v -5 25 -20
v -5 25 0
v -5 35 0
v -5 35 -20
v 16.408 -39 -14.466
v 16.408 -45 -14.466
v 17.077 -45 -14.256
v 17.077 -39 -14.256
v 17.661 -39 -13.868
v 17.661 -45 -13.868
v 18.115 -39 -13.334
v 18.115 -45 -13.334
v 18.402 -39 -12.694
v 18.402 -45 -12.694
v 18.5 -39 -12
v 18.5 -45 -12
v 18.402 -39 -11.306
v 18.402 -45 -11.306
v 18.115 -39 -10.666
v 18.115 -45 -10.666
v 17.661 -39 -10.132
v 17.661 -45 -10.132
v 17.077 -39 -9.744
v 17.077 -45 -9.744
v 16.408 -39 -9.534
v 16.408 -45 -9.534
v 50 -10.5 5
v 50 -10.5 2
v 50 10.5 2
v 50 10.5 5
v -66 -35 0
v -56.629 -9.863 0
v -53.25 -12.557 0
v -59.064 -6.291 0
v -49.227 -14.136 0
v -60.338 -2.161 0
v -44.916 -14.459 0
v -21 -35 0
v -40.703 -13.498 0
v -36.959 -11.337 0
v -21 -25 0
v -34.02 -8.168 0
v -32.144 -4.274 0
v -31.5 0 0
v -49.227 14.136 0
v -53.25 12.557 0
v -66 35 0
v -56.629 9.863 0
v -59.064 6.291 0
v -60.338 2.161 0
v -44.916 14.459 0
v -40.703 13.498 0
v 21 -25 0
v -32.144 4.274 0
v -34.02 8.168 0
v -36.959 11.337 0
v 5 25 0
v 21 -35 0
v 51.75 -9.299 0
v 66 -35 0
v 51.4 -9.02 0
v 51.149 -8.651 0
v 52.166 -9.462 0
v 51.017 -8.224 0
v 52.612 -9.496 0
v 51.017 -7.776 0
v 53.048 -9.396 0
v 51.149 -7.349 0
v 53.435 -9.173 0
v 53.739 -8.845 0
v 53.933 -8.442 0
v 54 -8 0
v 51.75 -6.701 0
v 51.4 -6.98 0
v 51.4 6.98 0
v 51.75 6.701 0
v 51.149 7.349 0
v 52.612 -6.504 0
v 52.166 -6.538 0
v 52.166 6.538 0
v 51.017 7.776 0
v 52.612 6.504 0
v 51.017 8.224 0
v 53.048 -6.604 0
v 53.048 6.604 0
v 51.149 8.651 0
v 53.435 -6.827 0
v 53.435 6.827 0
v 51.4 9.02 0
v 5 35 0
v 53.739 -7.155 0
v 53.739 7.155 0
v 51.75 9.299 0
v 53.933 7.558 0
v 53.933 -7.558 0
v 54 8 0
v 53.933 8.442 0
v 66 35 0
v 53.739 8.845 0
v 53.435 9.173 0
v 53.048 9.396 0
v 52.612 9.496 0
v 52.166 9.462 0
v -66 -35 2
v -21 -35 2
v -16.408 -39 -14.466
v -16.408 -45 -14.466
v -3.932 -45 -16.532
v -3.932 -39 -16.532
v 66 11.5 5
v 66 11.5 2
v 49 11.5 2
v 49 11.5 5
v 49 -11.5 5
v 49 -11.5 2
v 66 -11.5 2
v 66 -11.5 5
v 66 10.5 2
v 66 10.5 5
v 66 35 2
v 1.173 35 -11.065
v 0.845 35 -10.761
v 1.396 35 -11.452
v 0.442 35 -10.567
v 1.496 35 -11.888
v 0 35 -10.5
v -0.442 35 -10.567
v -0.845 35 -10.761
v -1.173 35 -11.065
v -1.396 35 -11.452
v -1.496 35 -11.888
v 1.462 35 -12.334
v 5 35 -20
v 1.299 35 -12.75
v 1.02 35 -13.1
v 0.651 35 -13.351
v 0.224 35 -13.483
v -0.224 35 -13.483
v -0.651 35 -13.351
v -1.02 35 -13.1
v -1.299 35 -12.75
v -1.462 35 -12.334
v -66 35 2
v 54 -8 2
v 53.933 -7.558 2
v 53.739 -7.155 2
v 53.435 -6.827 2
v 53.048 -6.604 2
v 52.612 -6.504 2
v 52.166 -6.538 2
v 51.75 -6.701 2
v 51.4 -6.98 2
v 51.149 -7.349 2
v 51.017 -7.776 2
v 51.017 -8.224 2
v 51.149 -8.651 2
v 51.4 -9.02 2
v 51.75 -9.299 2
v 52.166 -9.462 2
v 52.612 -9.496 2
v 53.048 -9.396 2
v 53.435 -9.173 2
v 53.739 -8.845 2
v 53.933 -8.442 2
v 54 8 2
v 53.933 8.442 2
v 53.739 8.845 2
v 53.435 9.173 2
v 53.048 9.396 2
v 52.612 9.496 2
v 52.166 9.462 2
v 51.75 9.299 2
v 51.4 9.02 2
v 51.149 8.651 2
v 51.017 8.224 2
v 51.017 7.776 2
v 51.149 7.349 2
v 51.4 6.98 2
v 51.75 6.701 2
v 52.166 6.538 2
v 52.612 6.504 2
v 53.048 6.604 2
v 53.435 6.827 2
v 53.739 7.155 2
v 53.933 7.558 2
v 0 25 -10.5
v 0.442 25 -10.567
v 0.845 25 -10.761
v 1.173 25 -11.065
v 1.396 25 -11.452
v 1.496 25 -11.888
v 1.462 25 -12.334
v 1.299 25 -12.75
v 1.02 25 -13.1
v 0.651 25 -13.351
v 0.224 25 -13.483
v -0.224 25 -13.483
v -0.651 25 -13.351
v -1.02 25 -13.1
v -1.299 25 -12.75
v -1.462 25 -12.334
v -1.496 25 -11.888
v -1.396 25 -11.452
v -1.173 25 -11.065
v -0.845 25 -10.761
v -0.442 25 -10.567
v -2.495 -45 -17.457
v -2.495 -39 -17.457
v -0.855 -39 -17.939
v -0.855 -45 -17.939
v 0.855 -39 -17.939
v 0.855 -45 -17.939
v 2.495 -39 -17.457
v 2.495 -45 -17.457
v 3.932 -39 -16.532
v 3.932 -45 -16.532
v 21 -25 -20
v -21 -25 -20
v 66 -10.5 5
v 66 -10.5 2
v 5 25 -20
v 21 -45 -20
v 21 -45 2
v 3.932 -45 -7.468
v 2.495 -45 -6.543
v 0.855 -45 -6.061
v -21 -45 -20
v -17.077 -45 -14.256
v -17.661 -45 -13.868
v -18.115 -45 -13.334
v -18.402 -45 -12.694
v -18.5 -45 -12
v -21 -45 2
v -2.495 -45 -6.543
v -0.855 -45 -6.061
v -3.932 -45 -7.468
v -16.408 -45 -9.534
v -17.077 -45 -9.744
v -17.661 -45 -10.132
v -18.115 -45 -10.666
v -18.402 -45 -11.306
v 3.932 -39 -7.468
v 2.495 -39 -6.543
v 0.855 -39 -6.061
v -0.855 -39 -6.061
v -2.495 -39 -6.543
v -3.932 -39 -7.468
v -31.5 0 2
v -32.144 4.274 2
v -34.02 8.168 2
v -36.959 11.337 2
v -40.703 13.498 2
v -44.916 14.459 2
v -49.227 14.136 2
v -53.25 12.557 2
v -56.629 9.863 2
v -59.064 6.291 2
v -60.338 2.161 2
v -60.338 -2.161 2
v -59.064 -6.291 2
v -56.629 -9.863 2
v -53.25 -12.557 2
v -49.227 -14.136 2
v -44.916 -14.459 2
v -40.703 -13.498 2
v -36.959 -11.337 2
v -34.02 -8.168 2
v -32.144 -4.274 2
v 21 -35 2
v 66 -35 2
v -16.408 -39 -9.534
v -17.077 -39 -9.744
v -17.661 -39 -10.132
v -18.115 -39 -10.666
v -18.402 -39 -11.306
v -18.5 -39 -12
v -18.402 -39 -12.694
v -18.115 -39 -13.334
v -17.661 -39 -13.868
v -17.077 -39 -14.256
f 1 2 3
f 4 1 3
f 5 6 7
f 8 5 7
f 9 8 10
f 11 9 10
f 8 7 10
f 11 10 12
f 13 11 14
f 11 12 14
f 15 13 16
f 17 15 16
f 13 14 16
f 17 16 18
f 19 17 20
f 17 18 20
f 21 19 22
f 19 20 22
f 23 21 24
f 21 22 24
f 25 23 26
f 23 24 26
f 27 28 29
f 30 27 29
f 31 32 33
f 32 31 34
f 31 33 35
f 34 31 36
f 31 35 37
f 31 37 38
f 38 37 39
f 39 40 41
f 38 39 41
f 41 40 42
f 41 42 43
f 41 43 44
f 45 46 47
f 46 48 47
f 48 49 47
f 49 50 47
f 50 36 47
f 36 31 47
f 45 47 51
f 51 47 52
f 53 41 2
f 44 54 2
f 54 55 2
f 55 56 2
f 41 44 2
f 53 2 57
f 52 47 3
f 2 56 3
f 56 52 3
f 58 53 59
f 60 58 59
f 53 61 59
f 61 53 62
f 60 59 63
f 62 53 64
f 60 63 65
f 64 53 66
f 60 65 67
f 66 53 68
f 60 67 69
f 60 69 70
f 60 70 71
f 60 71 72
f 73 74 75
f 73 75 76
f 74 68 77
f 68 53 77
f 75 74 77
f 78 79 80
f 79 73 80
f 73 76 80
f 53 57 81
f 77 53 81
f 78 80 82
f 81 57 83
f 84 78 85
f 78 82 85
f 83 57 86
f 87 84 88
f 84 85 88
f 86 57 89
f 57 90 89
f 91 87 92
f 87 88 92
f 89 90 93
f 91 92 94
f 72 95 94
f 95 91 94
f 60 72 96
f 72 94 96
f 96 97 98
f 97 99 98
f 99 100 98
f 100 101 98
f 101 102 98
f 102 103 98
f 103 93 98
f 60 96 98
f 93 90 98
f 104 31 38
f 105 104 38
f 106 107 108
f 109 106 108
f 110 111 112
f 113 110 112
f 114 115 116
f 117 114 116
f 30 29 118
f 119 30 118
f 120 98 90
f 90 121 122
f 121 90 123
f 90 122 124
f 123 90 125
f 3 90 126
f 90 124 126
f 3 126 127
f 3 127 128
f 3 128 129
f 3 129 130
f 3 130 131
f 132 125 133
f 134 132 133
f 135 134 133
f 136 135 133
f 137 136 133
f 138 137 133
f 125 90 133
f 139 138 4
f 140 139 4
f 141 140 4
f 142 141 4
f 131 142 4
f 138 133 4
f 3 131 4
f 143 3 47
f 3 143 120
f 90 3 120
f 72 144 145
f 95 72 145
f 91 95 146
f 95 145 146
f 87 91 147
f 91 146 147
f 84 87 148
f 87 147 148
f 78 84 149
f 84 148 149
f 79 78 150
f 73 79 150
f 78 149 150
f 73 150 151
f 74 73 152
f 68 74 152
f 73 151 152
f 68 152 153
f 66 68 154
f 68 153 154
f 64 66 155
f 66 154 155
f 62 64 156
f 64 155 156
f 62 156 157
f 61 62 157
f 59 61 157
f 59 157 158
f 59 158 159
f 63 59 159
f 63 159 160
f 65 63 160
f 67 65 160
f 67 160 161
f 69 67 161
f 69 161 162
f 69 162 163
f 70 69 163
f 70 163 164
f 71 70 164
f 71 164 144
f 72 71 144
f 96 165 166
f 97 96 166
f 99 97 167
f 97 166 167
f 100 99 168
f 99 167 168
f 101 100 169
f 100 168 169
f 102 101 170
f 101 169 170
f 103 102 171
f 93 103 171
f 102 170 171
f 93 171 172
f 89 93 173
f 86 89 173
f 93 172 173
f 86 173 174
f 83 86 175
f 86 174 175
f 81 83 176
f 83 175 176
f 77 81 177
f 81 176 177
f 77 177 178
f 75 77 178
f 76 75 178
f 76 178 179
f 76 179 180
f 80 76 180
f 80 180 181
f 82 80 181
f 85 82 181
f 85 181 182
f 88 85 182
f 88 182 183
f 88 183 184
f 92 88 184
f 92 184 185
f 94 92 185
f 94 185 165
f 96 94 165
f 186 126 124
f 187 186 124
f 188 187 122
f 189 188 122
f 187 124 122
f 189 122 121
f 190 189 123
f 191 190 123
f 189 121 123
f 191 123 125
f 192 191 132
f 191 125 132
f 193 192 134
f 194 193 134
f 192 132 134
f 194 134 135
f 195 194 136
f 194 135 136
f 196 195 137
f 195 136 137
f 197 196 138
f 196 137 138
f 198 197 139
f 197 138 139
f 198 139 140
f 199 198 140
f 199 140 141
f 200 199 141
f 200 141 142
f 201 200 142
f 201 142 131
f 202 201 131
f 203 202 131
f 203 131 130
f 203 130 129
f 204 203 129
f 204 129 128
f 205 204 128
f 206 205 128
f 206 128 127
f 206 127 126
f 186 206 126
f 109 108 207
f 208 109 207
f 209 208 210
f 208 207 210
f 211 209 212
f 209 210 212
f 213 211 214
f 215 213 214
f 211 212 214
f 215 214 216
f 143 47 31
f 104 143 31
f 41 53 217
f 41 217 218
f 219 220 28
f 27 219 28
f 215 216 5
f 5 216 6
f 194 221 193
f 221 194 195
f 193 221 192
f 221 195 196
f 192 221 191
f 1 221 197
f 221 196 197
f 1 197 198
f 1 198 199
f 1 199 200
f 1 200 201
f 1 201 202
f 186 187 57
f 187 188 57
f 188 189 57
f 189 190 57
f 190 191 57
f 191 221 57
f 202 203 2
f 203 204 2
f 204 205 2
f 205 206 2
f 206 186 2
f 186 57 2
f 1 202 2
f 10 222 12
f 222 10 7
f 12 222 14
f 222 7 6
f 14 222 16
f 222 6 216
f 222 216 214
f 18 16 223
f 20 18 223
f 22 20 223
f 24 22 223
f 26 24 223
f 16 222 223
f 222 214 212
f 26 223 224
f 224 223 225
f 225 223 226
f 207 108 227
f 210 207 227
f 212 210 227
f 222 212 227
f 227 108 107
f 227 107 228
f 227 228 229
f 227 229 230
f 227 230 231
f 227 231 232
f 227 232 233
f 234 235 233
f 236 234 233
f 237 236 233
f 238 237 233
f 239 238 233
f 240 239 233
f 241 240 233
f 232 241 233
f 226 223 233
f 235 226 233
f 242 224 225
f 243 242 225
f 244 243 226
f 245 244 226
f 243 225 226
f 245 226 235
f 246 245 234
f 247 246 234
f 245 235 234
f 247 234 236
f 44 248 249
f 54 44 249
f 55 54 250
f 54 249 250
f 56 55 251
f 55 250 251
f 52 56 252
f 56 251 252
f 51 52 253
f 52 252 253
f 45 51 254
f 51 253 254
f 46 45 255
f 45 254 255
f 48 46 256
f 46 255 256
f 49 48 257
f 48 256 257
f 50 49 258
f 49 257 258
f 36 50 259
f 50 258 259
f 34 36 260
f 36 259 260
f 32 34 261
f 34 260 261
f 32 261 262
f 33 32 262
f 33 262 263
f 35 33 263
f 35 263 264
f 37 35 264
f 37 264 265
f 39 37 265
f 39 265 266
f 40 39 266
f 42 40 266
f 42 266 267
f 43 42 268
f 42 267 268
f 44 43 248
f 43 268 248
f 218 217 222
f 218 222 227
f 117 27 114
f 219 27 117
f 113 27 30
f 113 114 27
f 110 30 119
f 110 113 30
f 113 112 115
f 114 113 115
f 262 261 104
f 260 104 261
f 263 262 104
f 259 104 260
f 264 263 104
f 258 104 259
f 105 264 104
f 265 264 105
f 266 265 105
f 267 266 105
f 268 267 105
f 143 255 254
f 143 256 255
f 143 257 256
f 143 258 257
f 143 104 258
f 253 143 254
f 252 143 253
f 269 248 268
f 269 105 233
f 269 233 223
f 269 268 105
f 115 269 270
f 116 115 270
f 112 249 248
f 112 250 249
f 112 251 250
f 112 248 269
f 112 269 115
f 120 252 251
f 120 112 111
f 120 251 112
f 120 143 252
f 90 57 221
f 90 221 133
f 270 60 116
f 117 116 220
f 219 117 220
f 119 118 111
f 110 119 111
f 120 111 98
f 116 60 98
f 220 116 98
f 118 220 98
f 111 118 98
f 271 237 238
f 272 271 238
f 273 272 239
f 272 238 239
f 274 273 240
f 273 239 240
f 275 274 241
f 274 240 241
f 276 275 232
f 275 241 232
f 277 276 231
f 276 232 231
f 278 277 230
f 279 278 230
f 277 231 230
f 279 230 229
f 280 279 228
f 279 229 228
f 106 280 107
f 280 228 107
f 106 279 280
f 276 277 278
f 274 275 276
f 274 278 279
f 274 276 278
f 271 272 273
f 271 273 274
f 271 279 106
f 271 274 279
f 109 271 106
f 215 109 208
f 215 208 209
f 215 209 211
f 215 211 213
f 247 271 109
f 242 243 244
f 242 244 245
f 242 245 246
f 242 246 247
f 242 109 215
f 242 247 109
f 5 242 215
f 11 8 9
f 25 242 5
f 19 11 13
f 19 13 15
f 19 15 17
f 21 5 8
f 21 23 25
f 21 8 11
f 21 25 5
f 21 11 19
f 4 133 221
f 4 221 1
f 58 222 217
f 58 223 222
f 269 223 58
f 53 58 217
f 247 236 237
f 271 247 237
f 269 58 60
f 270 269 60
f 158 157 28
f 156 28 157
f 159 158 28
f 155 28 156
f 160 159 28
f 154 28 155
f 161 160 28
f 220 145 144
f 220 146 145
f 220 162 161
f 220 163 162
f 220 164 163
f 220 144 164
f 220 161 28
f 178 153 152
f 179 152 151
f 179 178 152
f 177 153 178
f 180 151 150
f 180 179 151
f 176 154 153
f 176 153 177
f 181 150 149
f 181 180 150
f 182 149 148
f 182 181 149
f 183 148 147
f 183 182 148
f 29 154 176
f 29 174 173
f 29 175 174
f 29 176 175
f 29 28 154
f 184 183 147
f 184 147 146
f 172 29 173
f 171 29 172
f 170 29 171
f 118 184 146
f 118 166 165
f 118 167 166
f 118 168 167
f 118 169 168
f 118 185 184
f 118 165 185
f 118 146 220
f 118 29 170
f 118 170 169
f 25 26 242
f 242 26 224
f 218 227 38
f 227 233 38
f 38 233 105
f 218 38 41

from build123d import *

# Parameters (mm, degrees)
BOSS_EXTRUDE1_DEPTH = 2
SKETCH2_R           = 14.5
CUT_EXTRUDE1_DEPTH  = 2
BOSS_EXTRUDE2_DEPTH = 3
CUT_EXTRUDE2_REACH  = 81.937
SKETCH5_R           = 1.5
SKETCH6_W           = 10
SKETCH6_H           = 10
BOSS_EXTRUDE3_DEPTH = 20
SKETCH10_W          = 42
SKETCH10_H          = 20
BOSS_EXTRUDE5_DEPTH = 20
CUT_EXTRUDE3_DEPTH  = 6
CUT_EXTRUDE4_REACH  = 107.622
SKETCH12_R          = 1.5


with BuildPart() as part:
    # Sketch1 → Boss-Extrude1 (new body)
    with BuildSketch(Plane.XY):
        Polygon((21, -35), (66, -35), (66, 35), (-66, 35), (-66, -35), (-21, -35), (-21, -45), (21, -45), align=None)
    extrude(amount=BOSS_EXTRUDE1_DEPTH)

    # Sketch2 → Cut-Extrude1 (cut)
    with BuildSketch(Plane.XY.offset(2)):
        with Locations((-46, 0)):
            Circle(SKETCH2_R)
    extrude(amount=-CUT_EXTRUDE1_DEPTH, mode=Mode.SUBTRACT)

    # Sketch3 → Boss-Extrude2 (add)
    with BuildSketch(Plane.XY.offset(2)):
        Polygon((50, -10.5), (50, 10.5), (66, 10.5), (66, 11.5), (49, 11.5), (49, -11.5), (66, -11.5), (66, -10.5), align=None)
    extrude(amount=BOSS_EXTRUDE2_DEPTH)

    # Sketch5 → Cut-Extrude2 (cut, up to next)
    with BuildSketch(Plane.XY.offset(2), mode=Mode.PRIVATE) as cut_extrude2_sk1:
        with Locations((52.5, 8)):
            Circle(SKETCH5_R)
    cut_extrude2_tool1 = extrude(cut_extrude2_sk1.sketch, amount=-CUT_EXTRUDE2_REACH, mode=Mode.PRIVATE) & part.part
    # Sketch5 → Cut-Extrude2 (cut, up to next)
    with BuildSketch(Plane.XY.offset(2), mode=Mode.PRIVATE) as cut_extrude2_sk2:
        with Locations((52.5, -8)):
            Circle(SKETCH5_R)
    cut_extrude2_tool2 = extrude(cut_extrude2_sk2.sketch, amount=-CUT_EXTRUDE2_REACH, mode=Mode.PRIVATE) & part.part
    add(cut_extrude2_tool1.solids().sort_by_distance((52.5, 8, 2))[0], mode=Mode.SUBTRACT)
    add(cut_extrude2_tool2.solids().sort_by_distance((52.5, -8, 2))[0], mode=Mode.SUBTRACT)

    # Sketch6 → Boss-Extrude3 (add)
    with BuildSketch(Plane(origin=(0, 0, 0), x_dir=(-1, 0, 0), z_dir=(0, 0, -1))):
        with Locations((0, 30)):
            Rectangle(SKETCH6_W, SKETCH6_H)
    extrude(amount=BOSS_EXTRUDE3_DEPTH)

    # Sketch10 → Boss-Extrude5 (add)
    with BuildSketch(Plane(origin=(0, 0, 0), x_dir=(-1, 0, 0), z_dir=(0, 0, -1))):
        with Locations((0, -35)):
            Rectangle(SKETCH10_W, SKETCH10_H)
    extrude(amount=BOSS_EXTRUDE5_DEPTH)

    # Sketch11 → Cut-Extrude3 (cut)
    with BuildSketch(Plane.XZ.offset(45)):
        with BuildLine():
            Line((-3.932248681, -7.468176933), (-16.408317349, -9.533589408))
            ThreePointArc((-16.408317349, -9.533589408), (-18.5, -12.000023193), (-16.408309881, -14.466450643))
            Line((-16.408309881, -14.466450643), (-3.932248681, -16.531823067))
            ThreePointArc((-3.932248681, -16.531823067), (0, -18), (3.932248681, -16.531823067))
            Line((3.932248681, -16.531823067), (16.408313615, -14.466430618))
            ThreePointArc((16.408313615, -14.466430618), (18.5, -12), (16.408313615, -9.533569382))
            Line((16.408313615, -9.533569382), (3.932248681, -7.468176933))
            ThreePointArc((3.932248681, -7.468176933), (0, -6), (-3.932248681, -7.468176933))
        make_face()
    extrude(amount=-CUT_EXTRUDE3_DEPTH, mode=Mode.SUBTRACT)

    # Sketch12 → Cut-Extrude4 (cut, up to next)
    with BuildSketch(Plane(origin=(0, 35, 0), x_dir=(1, 0, 0), z_dir=(0, 1, 0)), mode=Mode.PRIVATE) as cut_extrude4_sk1:
        with Locations(Location((0, 12, 0), (0, 0, 270))):
            Circle(SKETCH12_R)
    cut_extrude4_tool1 = extrude(cut_extrude4_sk1.sketch, amount=-CUT_EXTRUDE4_REACH, mode=Mode.PRIVATE) & part.part
    add(cut_extrude4_tool1.solids().sort_by_distance((0, 35, -12))[0], mode=Mode.SUBTRACT)


solid = part.part
